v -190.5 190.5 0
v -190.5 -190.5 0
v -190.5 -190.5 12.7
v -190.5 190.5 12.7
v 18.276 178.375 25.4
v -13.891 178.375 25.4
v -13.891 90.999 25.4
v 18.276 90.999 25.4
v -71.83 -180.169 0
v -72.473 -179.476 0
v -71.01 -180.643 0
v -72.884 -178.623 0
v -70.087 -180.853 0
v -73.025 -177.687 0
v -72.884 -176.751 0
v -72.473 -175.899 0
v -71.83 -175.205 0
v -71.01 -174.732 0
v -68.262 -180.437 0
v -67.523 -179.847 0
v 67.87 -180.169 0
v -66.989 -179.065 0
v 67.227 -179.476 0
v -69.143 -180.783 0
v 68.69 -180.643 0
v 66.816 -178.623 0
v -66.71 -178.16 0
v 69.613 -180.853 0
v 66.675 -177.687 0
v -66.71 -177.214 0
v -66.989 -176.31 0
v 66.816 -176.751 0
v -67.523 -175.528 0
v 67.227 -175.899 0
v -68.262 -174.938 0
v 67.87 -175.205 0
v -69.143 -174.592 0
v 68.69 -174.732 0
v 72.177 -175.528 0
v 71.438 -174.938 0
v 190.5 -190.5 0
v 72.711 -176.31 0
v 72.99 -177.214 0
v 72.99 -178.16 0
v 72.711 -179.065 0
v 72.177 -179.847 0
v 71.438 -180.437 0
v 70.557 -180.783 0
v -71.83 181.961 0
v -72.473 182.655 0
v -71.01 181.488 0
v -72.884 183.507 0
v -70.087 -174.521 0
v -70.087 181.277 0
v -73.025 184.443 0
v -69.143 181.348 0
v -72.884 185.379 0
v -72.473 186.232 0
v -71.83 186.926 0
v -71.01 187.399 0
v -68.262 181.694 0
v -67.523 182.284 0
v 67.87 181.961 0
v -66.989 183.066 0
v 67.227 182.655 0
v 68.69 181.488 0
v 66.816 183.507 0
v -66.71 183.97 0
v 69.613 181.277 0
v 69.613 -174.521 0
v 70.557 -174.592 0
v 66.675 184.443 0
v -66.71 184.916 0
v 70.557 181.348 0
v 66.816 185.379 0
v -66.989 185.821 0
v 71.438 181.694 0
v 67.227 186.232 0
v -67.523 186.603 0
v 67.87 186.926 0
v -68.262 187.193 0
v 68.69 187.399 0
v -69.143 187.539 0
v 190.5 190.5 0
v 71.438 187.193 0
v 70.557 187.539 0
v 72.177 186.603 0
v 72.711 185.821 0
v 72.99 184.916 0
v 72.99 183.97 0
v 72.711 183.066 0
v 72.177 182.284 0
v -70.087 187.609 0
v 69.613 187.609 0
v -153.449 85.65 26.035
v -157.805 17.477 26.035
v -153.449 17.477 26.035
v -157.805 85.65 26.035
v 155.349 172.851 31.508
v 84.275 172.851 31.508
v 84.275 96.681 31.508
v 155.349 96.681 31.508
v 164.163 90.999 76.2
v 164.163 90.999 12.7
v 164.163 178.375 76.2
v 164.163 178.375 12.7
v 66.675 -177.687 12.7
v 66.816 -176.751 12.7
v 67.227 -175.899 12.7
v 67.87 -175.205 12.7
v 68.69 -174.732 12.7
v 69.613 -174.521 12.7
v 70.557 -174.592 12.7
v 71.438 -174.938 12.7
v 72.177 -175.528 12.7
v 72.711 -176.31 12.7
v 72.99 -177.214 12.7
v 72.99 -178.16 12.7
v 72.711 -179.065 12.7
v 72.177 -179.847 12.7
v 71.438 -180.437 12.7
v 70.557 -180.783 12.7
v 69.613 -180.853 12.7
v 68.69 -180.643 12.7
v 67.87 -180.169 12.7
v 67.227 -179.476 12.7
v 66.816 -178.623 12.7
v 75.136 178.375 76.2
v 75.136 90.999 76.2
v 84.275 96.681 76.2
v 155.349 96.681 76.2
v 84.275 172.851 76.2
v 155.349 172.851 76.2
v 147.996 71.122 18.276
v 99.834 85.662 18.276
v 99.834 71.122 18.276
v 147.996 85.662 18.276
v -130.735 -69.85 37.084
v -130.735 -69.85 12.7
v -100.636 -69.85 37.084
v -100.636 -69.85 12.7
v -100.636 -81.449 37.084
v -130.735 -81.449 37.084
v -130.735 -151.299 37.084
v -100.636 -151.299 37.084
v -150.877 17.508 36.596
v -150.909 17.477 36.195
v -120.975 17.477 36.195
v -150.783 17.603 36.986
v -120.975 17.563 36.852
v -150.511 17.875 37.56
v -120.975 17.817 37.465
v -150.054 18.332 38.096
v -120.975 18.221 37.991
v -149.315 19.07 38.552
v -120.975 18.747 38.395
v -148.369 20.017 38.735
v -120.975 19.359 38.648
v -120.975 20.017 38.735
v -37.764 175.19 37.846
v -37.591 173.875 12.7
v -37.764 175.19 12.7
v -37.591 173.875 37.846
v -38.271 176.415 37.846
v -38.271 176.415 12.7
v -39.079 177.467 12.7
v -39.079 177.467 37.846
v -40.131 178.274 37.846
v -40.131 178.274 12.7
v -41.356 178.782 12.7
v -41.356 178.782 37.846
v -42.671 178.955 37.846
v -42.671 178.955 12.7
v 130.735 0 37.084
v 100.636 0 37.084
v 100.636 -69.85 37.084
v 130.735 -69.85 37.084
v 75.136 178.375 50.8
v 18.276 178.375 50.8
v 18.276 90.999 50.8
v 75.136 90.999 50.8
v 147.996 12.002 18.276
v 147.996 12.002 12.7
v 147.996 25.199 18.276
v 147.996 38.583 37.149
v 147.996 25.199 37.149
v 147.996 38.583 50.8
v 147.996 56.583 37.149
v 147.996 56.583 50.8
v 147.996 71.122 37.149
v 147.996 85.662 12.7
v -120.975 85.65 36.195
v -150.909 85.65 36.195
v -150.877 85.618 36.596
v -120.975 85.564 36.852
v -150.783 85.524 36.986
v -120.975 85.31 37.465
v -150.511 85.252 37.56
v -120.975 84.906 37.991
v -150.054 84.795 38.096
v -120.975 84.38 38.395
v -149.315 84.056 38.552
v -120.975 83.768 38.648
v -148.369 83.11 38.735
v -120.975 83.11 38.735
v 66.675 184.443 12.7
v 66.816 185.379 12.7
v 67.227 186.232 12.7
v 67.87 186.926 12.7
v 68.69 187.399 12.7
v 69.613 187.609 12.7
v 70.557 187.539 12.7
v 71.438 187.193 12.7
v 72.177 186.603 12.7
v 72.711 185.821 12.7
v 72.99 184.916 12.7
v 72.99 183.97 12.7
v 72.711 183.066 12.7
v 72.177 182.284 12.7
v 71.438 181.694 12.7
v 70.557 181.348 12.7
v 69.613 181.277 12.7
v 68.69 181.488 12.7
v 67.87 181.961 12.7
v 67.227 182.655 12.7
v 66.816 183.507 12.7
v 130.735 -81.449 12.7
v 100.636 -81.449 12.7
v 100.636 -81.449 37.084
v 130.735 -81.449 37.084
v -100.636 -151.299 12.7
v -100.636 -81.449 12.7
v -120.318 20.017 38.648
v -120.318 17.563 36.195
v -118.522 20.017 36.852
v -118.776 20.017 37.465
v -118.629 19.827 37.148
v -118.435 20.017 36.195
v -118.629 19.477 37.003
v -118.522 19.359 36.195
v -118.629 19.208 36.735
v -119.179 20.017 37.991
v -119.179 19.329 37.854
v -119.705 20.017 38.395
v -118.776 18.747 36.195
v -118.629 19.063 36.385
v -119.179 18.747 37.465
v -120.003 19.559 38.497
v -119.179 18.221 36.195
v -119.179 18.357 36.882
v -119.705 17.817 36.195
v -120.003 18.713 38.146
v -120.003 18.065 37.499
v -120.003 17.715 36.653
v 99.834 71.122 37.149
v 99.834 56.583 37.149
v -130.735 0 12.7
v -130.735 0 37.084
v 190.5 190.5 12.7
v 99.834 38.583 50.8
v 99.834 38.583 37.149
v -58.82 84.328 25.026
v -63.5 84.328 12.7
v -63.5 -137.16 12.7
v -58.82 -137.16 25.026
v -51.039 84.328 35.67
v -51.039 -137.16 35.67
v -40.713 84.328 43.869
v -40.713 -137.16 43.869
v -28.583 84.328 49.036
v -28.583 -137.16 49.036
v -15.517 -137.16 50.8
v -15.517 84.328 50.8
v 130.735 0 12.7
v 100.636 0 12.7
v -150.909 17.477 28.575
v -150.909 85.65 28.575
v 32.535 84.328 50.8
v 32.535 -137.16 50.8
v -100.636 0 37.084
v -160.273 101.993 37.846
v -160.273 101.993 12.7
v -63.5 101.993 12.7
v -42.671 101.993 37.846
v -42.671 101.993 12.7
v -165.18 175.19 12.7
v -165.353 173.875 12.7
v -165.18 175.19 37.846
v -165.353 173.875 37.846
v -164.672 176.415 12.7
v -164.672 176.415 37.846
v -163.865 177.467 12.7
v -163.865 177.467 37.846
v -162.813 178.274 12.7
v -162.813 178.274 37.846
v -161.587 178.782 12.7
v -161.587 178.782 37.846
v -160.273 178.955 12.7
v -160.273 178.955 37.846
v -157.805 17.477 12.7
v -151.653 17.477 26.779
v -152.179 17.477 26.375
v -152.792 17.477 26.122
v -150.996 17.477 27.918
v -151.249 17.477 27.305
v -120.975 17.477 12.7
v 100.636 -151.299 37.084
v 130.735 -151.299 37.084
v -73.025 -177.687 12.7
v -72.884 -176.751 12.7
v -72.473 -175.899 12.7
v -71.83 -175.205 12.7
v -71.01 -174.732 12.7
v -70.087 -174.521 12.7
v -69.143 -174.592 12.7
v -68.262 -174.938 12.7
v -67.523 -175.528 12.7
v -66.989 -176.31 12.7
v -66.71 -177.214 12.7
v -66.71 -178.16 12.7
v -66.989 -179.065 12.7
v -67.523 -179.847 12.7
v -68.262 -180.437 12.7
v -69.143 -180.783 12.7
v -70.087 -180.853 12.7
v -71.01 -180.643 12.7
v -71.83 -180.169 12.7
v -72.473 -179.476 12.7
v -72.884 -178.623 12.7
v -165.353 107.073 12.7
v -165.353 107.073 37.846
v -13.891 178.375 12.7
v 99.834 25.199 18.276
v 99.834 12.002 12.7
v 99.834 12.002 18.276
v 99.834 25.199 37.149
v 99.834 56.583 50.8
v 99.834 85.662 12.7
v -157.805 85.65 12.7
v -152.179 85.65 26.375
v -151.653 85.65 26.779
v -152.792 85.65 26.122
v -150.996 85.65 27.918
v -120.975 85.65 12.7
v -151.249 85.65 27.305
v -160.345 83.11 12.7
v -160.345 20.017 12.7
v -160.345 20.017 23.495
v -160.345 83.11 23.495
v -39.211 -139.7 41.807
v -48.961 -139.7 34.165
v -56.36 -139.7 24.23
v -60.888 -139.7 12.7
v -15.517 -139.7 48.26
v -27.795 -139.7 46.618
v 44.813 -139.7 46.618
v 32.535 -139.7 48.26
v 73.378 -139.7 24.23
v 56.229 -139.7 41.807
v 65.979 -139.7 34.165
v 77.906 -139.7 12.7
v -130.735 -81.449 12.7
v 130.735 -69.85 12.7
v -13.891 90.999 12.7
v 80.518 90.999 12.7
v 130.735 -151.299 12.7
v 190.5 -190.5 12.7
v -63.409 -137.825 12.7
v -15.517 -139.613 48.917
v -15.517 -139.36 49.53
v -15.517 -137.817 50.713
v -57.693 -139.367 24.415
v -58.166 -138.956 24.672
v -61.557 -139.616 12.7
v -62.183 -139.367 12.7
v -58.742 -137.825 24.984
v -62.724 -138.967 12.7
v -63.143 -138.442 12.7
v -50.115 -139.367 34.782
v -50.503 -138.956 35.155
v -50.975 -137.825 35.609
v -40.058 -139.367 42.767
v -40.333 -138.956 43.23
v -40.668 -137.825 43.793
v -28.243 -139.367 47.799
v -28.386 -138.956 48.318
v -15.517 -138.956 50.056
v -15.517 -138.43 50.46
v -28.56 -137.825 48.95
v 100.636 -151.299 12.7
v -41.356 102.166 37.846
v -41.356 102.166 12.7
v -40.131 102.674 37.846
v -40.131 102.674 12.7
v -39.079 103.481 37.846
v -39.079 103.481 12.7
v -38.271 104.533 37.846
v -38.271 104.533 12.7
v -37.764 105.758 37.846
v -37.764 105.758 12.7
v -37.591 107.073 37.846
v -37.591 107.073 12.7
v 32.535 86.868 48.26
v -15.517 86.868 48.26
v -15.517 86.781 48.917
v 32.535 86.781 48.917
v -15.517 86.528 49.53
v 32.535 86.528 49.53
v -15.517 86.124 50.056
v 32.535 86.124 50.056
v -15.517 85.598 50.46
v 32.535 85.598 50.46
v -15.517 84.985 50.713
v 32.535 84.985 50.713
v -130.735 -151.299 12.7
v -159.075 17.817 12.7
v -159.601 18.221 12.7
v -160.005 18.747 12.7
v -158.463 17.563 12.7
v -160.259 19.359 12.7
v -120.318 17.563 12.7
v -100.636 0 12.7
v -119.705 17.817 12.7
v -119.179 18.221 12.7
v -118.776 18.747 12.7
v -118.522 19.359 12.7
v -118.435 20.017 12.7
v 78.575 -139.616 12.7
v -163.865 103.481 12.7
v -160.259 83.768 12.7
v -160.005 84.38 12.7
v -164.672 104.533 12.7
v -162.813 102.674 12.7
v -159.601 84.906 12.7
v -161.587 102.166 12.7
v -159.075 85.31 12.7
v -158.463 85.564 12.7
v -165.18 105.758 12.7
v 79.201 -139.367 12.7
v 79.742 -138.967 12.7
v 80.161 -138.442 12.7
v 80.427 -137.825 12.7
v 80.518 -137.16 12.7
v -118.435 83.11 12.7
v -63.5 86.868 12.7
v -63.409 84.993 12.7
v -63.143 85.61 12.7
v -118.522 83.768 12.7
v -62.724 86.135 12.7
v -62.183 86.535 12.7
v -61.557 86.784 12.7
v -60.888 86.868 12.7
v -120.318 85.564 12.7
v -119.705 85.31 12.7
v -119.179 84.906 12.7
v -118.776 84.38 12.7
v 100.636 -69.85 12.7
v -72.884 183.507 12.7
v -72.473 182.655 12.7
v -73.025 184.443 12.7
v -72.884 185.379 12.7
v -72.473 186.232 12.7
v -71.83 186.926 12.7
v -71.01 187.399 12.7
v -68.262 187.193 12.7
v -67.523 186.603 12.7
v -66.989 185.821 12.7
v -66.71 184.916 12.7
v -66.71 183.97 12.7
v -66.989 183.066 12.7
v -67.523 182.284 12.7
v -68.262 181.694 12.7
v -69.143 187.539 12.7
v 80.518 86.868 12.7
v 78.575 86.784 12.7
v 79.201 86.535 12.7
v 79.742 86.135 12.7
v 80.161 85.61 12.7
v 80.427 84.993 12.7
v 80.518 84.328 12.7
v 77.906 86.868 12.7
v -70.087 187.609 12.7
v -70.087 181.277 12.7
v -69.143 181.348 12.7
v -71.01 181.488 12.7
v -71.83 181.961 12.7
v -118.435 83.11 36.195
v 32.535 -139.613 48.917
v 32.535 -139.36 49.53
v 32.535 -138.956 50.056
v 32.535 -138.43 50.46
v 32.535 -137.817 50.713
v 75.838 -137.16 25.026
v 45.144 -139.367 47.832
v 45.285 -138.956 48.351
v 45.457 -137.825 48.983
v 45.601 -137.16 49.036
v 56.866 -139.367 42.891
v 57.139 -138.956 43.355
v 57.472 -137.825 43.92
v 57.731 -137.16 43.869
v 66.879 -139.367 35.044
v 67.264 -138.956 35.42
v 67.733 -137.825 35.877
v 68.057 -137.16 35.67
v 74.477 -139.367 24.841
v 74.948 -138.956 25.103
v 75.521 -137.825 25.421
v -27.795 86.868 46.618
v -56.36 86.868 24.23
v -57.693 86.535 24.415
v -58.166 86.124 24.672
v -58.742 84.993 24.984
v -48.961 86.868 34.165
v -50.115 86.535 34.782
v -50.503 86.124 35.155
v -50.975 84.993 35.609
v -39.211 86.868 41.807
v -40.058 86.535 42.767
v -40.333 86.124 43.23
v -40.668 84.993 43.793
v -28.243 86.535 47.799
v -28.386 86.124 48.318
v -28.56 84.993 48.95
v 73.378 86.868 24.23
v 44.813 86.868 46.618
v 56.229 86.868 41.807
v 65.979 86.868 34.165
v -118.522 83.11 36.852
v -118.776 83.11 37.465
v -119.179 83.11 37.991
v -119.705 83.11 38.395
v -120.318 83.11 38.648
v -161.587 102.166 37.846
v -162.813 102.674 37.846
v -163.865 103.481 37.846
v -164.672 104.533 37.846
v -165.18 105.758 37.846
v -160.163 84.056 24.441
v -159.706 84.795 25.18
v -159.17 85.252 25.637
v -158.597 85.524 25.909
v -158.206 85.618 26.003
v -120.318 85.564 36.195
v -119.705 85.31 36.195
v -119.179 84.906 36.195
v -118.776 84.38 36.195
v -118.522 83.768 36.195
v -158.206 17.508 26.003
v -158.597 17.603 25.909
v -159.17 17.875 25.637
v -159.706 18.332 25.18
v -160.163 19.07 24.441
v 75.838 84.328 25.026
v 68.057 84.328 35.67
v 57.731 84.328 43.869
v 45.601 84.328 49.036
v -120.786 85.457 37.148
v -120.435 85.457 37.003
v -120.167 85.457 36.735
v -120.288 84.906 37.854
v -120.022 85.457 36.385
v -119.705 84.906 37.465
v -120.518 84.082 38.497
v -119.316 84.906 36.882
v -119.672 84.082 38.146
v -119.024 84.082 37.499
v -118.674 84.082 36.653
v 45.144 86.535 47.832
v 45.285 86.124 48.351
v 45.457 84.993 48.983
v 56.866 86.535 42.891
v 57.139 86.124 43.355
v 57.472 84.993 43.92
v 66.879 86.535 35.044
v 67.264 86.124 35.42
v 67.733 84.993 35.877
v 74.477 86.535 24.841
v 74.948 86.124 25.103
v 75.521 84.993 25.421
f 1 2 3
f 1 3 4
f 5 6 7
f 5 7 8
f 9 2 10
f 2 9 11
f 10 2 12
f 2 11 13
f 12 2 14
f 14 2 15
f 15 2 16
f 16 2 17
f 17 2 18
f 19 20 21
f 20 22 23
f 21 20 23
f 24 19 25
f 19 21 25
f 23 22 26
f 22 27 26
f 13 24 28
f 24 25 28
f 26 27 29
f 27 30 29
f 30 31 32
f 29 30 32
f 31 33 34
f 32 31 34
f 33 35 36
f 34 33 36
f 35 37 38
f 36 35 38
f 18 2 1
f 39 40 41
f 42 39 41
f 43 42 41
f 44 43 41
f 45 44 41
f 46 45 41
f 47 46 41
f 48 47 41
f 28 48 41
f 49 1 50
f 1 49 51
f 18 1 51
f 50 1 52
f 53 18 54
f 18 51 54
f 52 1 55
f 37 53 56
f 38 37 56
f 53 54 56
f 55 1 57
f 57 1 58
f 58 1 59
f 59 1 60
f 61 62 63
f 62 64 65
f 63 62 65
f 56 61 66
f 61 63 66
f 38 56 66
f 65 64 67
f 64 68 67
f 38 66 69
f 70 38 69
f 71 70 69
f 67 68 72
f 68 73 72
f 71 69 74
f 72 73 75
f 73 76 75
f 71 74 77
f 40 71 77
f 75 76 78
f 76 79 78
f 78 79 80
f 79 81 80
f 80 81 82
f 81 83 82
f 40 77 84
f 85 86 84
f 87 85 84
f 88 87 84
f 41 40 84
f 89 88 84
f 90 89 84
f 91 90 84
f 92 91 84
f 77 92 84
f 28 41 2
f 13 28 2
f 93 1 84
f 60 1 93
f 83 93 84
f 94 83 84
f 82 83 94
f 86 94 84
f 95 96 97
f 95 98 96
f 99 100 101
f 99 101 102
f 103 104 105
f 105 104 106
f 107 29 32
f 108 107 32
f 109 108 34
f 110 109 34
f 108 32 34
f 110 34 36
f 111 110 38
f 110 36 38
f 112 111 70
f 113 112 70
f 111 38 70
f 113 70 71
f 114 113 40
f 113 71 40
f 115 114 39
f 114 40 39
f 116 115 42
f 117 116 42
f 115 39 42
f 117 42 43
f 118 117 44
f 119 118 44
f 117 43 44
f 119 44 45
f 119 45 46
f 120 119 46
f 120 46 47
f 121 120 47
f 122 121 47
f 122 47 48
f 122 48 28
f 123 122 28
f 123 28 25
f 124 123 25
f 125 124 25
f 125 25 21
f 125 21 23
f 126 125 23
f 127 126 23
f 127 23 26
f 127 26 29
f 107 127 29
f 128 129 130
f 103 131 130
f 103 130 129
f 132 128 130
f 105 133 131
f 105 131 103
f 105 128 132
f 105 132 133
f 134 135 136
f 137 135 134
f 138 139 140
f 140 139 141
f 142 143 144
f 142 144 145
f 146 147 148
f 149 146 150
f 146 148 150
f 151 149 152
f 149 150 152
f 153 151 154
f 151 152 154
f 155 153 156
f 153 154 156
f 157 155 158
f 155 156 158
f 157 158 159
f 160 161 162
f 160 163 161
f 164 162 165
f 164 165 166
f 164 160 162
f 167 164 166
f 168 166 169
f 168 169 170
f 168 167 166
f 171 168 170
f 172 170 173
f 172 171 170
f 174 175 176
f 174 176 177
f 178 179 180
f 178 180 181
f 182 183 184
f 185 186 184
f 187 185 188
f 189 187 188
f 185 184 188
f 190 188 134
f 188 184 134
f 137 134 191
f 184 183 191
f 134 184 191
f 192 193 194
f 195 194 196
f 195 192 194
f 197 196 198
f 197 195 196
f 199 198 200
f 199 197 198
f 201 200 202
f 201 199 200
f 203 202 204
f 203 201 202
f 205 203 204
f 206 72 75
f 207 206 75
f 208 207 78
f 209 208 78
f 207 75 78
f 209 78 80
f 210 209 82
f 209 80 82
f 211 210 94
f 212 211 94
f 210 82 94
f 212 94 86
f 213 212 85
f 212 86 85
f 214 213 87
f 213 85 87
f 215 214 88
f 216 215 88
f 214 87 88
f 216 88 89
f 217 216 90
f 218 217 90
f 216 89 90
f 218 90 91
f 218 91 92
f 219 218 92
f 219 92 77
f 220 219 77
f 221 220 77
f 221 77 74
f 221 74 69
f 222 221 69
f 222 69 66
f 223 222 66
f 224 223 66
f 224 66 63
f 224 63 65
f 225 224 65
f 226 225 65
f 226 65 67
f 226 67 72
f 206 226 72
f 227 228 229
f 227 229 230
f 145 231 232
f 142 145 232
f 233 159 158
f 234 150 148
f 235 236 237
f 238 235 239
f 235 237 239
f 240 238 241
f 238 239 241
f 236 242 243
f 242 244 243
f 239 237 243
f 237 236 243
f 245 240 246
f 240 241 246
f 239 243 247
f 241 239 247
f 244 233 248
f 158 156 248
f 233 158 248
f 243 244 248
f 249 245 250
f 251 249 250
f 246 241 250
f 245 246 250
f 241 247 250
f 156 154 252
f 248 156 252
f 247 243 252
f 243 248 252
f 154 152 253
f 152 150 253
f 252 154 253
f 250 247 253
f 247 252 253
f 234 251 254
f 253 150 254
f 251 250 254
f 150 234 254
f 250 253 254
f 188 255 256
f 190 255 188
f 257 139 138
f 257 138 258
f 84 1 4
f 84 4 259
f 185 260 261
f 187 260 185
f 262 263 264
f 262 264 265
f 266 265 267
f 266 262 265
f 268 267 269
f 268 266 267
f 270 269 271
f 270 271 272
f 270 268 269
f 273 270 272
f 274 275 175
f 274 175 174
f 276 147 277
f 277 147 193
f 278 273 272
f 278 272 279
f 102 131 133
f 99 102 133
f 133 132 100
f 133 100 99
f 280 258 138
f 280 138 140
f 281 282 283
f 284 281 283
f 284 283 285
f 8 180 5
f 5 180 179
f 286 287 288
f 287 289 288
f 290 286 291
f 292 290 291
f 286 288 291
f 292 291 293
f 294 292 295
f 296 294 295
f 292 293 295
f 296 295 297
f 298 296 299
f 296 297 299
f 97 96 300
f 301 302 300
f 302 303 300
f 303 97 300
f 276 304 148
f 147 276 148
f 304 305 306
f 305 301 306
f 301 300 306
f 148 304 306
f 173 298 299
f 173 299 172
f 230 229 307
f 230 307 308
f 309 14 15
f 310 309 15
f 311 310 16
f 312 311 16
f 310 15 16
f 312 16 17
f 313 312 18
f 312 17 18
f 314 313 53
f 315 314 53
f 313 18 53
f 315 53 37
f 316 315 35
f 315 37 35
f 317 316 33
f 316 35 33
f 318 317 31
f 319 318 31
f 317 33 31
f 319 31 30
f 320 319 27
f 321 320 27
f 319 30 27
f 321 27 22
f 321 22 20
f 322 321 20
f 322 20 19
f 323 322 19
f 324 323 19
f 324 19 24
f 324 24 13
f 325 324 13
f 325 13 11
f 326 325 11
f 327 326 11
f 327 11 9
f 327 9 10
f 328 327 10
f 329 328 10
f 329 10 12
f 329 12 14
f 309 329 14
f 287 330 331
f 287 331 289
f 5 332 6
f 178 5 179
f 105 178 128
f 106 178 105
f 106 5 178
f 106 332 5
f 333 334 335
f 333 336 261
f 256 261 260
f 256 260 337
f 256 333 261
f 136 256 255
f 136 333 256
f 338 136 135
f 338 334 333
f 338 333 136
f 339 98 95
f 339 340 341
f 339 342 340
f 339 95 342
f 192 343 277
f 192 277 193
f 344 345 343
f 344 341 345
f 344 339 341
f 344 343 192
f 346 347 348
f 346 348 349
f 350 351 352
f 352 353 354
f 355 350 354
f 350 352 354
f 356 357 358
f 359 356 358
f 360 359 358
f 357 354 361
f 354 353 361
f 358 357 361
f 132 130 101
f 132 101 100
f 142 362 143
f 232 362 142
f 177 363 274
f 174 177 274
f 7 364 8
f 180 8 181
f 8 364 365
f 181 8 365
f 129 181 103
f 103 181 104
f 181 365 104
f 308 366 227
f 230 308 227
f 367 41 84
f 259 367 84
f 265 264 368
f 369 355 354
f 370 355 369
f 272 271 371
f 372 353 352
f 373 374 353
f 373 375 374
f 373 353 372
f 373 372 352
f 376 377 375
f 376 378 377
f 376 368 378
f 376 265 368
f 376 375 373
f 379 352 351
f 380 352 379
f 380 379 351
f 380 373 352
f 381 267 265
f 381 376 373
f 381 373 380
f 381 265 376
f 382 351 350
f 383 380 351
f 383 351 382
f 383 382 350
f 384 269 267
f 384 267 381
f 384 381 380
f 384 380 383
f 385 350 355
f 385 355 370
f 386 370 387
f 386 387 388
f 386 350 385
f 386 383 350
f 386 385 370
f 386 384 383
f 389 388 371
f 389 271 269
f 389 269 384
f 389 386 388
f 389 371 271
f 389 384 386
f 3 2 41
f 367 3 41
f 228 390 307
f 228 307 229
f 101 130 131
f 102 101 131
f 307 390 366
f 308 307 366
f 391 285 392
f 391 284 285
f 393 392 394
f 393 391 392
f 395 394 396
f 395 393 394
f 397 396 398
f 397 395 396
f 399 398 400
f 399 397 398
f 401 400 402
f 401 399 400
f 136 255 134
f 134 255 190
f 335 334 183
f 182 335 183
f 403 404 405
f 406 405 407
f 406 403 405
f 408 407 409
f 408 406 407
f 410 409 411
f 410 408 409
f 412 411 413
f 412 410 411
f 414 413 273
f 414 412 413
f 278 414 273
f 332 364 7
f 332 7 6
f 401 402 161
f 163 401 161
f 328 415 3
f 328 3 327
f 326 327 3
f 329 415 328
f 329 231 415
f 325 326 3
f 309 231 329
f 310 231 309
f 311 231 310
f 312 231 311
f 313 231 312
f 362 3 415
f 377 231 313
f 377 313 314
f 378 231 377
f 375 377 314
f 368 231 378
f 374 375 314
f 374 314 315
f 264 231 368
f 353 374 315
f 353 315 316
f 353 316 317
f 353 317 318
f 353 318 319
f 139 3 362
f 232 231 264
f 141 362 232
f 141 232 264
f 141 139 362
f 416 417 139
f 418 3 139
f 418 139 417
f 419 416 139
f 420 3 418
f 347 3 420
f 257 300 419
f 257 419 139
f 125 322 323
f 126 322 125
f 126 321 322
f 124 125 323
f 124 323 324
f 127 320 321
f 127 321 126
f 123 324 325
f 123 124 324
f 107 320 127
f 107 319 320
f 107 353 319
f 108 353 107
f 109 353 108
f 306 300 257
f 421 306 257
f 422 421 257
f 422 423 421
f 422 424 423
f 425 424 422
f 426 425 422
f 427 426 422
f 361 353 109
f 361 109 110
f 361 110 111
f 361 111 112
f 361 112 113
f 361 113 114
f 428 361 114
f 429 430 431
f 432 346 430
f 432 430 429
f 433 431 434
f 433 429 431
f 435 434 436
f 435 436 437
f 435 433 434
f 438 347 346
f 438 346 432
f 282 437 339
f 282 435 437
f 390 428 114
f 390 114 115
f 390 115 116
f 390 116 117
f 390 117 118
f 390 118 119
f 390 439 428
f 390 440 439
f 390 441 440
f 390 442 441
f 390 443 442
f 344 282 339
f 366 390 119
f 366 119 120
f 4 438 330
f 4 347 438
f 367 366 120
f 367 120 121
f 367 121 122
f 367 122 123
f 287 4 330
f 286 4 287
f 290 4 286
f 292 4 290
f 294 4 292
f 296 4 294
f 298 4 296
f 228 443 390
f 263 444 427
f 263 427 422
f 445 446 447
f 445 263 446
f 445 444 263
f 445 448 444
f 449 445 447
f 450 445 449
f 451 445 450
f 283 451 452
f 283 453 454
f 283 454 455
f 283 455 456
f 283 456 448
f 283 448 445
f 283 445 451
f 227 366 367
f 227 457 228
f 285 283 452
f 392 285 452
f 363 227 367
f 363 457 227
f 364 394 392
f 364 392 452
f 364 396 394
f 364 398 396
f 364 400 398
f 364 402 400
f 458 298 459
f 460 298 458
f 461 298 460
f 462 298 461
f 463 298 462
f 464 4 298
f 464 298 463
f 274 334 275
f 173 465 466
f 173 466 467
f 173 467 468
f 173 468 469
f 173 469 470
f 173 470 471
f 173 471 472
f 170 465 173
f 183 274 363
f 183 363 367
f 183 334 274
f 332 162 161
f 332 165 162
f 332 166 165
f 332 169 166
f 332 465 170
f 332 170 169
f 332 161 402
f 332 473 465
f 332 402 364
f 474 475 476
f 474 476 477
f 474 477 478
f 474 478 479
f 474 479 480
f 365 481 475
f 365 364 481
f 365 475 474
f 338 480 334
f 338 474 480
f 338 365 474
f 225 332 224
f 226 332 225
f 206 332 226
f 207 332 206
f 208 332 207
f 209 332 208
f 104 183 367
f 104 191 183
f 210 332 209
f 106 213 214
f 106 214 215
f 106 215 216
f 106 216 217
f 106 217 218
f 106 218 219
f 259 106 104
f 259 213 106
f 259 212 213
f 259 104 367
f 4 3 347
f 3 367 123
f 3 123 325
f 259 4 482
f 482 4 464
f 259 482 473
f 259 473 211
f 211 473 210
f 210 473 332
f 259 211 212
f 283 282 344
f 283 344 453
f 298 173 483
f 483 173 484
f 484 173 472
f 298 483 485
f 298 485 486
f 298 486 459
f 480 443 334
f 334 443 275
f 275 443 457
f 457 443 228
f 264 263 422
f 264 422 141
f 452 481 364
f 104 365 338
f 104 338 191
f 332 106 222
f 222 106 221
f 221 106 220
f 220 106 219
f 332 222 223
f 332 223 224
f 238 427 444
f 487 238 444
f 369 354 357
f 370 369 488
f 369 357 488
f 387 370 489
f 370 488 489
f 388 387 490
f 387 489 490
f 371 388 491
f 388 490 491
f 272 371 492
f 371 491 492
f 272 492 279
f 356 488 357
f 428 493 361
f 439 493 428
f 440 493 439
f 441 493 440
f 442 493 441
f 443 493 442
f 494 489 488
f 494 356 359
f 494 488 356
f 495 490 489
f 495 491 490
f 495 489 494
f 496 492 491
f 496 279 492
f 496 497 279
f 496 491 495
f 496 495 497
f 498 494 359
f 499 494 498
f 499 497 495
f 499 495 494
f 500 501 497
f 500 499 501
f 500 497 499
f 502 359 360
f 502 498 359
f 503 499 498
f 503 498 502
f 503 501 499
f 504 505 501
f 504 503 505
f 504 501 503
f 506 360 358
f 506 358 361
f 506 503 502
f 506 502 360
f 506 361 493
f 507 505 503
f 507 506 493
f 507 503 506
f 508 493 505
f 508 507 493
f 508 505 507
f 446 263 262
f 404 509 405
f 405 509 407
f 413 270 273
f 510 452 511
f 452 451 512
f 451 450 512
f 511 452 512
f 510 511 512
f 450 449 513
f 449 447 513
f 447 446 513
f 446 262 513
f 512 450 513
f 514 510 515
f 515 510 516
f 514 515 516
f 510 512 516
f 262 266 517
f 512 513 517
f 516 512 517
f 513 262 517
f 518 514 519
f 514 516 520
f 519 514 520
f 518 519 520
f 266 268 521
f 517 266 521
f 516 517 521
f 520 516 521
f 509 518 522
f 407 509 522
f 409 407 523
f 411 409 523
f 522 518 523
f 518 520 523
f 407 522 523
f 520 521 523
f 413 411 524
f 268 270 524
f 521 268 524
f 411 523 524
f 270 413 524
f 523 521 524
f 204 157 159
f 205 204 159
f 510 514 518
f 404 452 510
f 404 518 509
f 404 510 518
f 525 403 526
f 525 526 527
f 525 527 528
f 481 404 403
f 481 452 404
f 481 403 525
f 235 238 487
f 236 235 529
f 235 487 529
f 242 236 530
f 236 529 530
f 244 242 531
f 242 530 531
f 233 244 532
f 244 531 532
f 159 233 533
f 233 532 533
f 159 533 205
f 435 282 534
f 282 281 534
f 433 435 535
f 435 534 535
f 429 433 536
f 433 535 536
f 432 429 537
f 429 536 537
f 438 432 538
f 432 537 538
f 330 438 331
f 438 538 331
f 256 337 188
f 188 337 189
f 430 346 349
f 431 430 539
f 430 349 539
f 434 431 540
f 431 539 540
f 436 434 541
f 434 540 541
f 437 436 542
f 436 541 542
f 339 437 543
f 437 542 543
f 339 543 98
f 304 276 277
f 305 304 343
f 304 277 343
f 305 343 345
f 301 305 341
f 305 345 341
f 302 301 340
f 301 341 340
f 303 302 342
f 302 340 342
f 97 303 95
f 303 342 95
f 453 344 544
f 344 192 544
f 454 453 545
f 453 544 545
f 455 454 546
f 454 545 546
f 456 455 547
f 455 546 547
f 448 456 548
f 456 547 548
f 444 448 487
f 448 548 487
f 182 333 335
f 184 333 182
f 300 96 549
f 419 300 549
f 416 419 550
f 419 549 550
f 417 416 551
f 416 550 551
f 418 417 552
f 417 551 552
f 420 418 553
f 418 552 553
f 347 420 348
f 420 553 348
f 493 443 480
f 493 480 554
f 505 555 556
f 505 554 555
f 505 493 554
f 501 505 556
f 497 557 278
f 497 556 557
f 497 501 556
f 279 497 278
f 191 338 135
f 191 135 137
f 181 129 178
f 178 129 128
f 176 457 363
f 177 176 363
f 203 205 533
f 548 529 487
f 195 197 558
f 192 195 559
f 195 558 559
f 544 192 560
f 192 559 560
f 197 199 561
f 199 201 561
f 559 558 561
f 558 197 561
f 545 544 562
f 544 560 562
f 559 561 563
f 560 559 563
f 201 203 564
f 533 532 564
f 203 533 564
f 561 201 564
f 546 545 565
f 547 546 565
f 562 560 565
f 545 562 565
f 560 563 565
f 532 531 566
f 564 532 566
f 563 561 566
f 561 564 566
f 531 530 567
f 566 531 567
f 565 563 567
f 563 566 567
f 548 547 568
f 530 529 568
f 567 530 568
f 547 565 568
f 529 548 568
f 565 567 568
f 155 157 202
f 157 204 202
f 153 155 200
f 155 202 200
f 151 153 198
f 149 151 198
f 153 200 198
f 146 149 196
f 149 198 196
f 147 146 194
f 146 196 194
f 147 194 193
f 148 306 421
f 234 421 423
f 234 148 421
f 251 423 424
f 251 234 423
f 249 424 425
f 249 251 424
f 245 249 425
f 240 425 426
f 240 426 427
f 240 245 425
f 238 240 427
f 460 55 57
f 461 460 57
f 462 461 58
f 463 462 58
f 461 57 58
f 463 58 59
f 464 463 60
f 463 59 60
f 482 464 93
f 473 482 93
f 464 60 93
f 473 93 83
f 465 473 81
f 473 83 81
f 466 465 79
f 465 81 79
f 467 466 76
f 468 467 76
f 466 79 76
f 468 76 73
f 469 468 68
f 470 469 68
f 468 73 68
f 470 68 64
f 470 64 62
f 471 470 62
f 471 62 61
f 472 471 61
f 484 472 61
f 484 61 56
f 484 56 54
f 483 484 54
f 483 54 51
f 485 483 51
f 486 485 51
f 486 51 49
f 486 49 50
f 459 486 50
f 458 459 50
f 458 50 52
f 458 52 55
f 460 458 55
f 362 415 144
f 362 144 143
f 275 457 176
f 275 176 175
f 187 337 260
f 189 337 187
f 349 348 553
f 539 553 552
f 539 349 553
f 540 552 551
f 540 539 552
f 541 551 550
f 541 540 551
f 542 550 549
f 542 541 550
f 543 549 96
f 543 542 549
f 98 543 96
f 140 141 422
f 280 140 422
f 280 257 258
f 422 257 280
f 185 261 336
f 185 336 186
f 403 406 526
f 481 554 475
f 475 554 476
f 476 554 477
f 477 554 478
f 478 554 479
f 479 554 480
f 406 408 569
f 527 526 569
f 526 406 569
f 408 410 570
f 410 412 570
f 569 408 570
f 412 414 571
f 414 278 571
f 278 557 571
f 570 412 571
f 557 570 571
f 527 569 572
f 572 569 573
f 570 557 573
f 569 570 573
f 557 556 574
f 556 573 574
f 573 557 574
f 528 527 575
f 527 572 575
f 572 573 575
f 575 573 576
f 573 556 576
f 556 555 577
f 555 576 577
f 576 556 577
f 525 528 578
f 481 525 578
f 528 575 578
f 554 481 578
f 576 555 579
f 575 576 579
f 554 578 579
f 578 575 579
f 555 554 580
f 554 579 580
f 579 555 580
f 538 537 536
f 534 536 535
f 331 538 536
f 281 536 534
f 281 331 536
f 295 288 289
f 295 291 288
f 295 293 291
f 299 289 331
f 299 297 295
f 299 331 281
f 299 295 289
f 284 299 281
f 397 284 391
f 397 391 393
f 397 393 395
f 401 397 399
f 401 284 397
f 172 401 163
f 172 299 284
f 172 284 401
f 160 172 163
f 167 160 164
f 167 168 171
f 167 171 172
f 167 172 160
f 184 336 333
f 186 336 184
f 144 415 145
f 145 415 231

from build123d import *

# Parameters (mm, degrees)
F0_W         = 381
F0_H         = 381
F1_DEPTH     = 12.7
F3_W         = 144.018
F3_H         = 226.568
F4_DEPTH     = 38.1
F5_W         = 178.054
F5_H         = 87.376
F6_DEPTH     = 63.5
F7_W         = 127.762
F7_H         = 76.962
F8_DEPTH     = 25.146
F9_W         = 41.91
F9_H         = 68.1736
F10_DEPTH    = 26.035
F11_W        = 48.1622978261
F11_H        = 73.66
F12_DEPTH    = 38.1
F13_W        = 30.099
F13_H        = 69.85
F14_DEPTH    = 24.384
F15_T4_DEPTH = 466.4836595949
F15_T9_DEPTH = 466.4836595949
F16_W        = 71.074873209
F16_H        = 76.1698335409
F17_DEPTH    = 44.69176
F18_W        = 89.027
F18_H        = 87.376
F19_DEPTH    = 25.4
F20_W        = 32.1671016191
F20_H        = 87.376
F21_DEPTH    = 25.4
F22_W        = 48.1622978261
F22_H        = 29.0787754375
F22_H_2      = 26.581694724
F23_DEPTH    = 13.65146
F24_W        = 48.1622978261
F24_H        = 14.5393877187
F24_H_2      = 14.3073135987
F25_DEPTH    = 18.87303
F26_W        = 9.4362943637
F26_H        = 68.1736
F27_DEPTH    = 12.7
F28_R        = 2.54
F30_D        = 6.35
F31_R        = 5.08


# Not quite as in the source:
# - a fillet or chamfer that OpenCascade refuses, or shapes differently, is made with other operations: its cross-section is extruded or revolved along the edge and cut away or added


with BuildPart() as f1:
    # F0 (on Top) → F1 (new body)
    with BuildSketch(Plane.XY):
        Rectangle(F0_W, F0_H)
    extrude(amount=F1_DEPTH)

    # F3 (on face) → F4 (join)
    with BuildSketch(Plane.XY.offset(12.7)):
        with Locations((8.509, -26.416)):
            Rectangle(F3_W, F3_H)
    extrude(amount=F4_DEPTH)

    # F5 (on face) → F6 (join)
    with BuildSketch(Plane.XY.offset(12.7)):
        with Locations((75.1363011077, 134.6866802573)):
            Rectangle(F5_W, F5_H)
    extrude(amount=F6_DEPTH)

    # F7 (on face) → F8 (join)
    with BuildSketch(Plane.XY.offset(12.7)):
        with Locations((-101.4716736972, 140.4740017718)):
            Rectangle(F7_W, F7_H)
    extrude(amount=F8_DEPTH)

    # F9 (on face) → F10 (join)
    with BuildSketch(Plane.XY.offset(12.7)):
        with Locations((-139.3904201686, 51.5634464747)):
            Rectangle(F9_W, F9_H)
    extrude(amount=F10_DEPTH)

    # F11 (on face) → F12 (join)
    with BuildSketch(Plane.XY.offset(12.7)):
        with Locations((123.9150092006, 48.8317962736)):
            Rectangle(F11_W, F11_H)
    extrude(amount=F12_DEPTH)

    # F13 (on face) → F14 (join)
    with BuildSketch(Plane.XY.offset(12.7)):
        with Locations((-115.685201868, -34.925)):
            Rectangle(F13_W, F13_H)
        with Locations((-115.685201868, -116.3742716573)):
            Rectangle(F13_W, F13_H)
        with Locations((115.685201868, -34.925)):
            Rectangle(F13_W, F13_H)
        with Locations((115.685201868, -116.3742716573)):
            Rectangle(F13_W, F13_H)
    extrude(amount=F14_DEPTH)

    # F15: fillet of radius 49.2649730808 on 2 edges, made by hand


with BuildPart() as f15_tool2:
    # F15_s3 → F15_t4 (new body)
    with BuildSketch(Plane.XZ.offset(259.6578297975)):
        with BuildLine():
            ThreePointArc((80.518, 12.7), (63.1697785132, 40.1166266199), (32.534868081, 50.8))
            Line((32.534868081, 50.8), (80.518, 50.8))
            Line((80.518, 50.8), (80.518, 12.7))
        make_face()
    extrude(amount=-F15_T4_DEPTH)

    split(bisect_by=Plane.XZ.offset(-90.9986802573), keep=Keep.TOP)


with BuildPart() as f1_1:
    add(f1.part)

    # F15_t1: cut F15_tool2
    add(f15_tool2.part, mode=Mode.SUBTRACT)


with BuildPart() as f15_tool7:
    # F15_s8 → F15_t9 (new body)
    with BuildSketch(Plane.XZ.offset(-206.8258297975)):
        with BuildLine():
            ThreePointArc((-63.5, 12.7), (-46.1517785132, 40.1166266199), (-15.516868081, 50.8))
            Line((-15.516868081, 50.8), (-63.5, 50.8))
            Line((-63.5, 50.8), (-63.5, 12.7))
        make_face()
    extrude(amount=F15_T9_DEPTH)

    split(bisect_by=Plane.XZ.offset(-101.9930017718), keep=Keep.TOP)


with BuildPart() as f1_2:
    add(f1_1.part)

    # F15_t6: cut F15_tool7
    add(f15_tool7.part, mode=Mode.SUBTRACT)

    # F16 (on face) → F17 (cut)
    with BuildSketch(Plane.XY.offset(76.2)):
        with Locations((119.8119372129, 134.7657069564)):
            Rectangle(F16_W, F16_H)
    extrude(amount=-F17_DEPTH, mode=Mode.SUBTRACT)

    # F18 (on face) → F19 (cut)
    with BuildSketch(Plane.XY.offset(76.2)):
        with Locations((30.6228011077, 134.6866802573)):
            Rectangle(F18_W, F18_H)
    extrude(amount=-F19_DEPTH, mode=Mode.SUBTRACT)

    # F20 (on face) → F21 (cut)
    with BuildSketch(Plane.XY.offset(50.8)):
        with Locations((2.1928519172, 134.6866802573)):
            Rectangle(F20_W, F20_H)
    extrude(amount=-F21_DEPTH, mode=Mode.SUBTRACT)

    # F22 (on face) → F23 (cut)
    with BuildSketch(Plane.XY.offset(50.8)):
        with Locations((123.9150092006, 71.1224085549)):
            Rectangle(F22_W, F22_H)
        with Locations((123.9150092006, 25.2926436356)):
            Rectangle(F22_W, F22_H_2)
    extrude(amount=-F23_DEPTH, mode=Mode.SUBTRACT)

    # F24 (on face) → F25 (cut)
    with BuildSketch(Plane.XY.offset(37.14854)):
        with Locations((123.9150092006, 78.3921024142)):
            Rectangle(F24_W, F24_H)
        with Locations((123.9150092006, 18.045573961)):
            Rectangle(F24_W, F24_H_2)
    extrude(amount=-F25_DEPTH, mode=Mode.SUBTRACT)

    # F26 (on face) → F27 (cut)
    with BuildSketch(Plane.XY.offset(38.735)):
        with Locations((-155.6272729868, 51.5634464747)):
            Rectangle(F26_W, F26_H)
    extrude(amount=-F27_DEPTH, mode=Mode.SUBTRACT)

    # F28
    f28_edges = [f1_2.edges().sort_by_distance(p)[0] for p in [
        (-150.909126, 51.563446, 26.035),
        (-160.34542, 51.563446, 26.035),
        (-150.909126, 51.563446, 38.735),
        (-134.672273, 17.476646, 38.735),
        (-118.43542, 51.563446, 38.735),
        (-134.672273, 85.650246, 38.735),
        (-118.43542, 17.476646, 25.7175),
        (32.534868, -26.416, 50.8),
        (8.509, -139.7, 50.8),
        (-15.516868, -26.416, 50.8),
        (8.509, 86.868, 50.8),
        (-160.34542, 17.476646, 19.3675),
        (-160.34542, 85.650246, 19.3675),
        (-118.43542, 85.650246, 25.7175),
        (63.169779, 86.868, 40.116627),
        (63.169779, -139.7, 40.116627),
        (-46.151779, -139.7, 40.116627),
        (-46.151779, 86.868, 40.116627),
    ]]
    fillet(f28_edges, radius=F28_R)

    # F30 (through all)
    with Locations(Plane.XY.offset(12.7)):
        with Locations((-69.85, -177.6871830225), (69.85, -177.6871830225), (69.85, 184.4432204962), (-69.85, 184.4432204962)):
            Hole(F30_D / 2)

    # F31
    f31_edges = [f1_2.edges().sort_by_distance(p)[0] for p in [
        (-37.590674, 101.993002, 25.273),
        (-165.352674, 101.993002, 25.273),
        (-165.352674, 178.955002, 25.273),
        (-37.590674, 178.955002, 25.273),
    ]]
    fillet(f31_edges, radius=F31_R)


solid = f1_2.part
